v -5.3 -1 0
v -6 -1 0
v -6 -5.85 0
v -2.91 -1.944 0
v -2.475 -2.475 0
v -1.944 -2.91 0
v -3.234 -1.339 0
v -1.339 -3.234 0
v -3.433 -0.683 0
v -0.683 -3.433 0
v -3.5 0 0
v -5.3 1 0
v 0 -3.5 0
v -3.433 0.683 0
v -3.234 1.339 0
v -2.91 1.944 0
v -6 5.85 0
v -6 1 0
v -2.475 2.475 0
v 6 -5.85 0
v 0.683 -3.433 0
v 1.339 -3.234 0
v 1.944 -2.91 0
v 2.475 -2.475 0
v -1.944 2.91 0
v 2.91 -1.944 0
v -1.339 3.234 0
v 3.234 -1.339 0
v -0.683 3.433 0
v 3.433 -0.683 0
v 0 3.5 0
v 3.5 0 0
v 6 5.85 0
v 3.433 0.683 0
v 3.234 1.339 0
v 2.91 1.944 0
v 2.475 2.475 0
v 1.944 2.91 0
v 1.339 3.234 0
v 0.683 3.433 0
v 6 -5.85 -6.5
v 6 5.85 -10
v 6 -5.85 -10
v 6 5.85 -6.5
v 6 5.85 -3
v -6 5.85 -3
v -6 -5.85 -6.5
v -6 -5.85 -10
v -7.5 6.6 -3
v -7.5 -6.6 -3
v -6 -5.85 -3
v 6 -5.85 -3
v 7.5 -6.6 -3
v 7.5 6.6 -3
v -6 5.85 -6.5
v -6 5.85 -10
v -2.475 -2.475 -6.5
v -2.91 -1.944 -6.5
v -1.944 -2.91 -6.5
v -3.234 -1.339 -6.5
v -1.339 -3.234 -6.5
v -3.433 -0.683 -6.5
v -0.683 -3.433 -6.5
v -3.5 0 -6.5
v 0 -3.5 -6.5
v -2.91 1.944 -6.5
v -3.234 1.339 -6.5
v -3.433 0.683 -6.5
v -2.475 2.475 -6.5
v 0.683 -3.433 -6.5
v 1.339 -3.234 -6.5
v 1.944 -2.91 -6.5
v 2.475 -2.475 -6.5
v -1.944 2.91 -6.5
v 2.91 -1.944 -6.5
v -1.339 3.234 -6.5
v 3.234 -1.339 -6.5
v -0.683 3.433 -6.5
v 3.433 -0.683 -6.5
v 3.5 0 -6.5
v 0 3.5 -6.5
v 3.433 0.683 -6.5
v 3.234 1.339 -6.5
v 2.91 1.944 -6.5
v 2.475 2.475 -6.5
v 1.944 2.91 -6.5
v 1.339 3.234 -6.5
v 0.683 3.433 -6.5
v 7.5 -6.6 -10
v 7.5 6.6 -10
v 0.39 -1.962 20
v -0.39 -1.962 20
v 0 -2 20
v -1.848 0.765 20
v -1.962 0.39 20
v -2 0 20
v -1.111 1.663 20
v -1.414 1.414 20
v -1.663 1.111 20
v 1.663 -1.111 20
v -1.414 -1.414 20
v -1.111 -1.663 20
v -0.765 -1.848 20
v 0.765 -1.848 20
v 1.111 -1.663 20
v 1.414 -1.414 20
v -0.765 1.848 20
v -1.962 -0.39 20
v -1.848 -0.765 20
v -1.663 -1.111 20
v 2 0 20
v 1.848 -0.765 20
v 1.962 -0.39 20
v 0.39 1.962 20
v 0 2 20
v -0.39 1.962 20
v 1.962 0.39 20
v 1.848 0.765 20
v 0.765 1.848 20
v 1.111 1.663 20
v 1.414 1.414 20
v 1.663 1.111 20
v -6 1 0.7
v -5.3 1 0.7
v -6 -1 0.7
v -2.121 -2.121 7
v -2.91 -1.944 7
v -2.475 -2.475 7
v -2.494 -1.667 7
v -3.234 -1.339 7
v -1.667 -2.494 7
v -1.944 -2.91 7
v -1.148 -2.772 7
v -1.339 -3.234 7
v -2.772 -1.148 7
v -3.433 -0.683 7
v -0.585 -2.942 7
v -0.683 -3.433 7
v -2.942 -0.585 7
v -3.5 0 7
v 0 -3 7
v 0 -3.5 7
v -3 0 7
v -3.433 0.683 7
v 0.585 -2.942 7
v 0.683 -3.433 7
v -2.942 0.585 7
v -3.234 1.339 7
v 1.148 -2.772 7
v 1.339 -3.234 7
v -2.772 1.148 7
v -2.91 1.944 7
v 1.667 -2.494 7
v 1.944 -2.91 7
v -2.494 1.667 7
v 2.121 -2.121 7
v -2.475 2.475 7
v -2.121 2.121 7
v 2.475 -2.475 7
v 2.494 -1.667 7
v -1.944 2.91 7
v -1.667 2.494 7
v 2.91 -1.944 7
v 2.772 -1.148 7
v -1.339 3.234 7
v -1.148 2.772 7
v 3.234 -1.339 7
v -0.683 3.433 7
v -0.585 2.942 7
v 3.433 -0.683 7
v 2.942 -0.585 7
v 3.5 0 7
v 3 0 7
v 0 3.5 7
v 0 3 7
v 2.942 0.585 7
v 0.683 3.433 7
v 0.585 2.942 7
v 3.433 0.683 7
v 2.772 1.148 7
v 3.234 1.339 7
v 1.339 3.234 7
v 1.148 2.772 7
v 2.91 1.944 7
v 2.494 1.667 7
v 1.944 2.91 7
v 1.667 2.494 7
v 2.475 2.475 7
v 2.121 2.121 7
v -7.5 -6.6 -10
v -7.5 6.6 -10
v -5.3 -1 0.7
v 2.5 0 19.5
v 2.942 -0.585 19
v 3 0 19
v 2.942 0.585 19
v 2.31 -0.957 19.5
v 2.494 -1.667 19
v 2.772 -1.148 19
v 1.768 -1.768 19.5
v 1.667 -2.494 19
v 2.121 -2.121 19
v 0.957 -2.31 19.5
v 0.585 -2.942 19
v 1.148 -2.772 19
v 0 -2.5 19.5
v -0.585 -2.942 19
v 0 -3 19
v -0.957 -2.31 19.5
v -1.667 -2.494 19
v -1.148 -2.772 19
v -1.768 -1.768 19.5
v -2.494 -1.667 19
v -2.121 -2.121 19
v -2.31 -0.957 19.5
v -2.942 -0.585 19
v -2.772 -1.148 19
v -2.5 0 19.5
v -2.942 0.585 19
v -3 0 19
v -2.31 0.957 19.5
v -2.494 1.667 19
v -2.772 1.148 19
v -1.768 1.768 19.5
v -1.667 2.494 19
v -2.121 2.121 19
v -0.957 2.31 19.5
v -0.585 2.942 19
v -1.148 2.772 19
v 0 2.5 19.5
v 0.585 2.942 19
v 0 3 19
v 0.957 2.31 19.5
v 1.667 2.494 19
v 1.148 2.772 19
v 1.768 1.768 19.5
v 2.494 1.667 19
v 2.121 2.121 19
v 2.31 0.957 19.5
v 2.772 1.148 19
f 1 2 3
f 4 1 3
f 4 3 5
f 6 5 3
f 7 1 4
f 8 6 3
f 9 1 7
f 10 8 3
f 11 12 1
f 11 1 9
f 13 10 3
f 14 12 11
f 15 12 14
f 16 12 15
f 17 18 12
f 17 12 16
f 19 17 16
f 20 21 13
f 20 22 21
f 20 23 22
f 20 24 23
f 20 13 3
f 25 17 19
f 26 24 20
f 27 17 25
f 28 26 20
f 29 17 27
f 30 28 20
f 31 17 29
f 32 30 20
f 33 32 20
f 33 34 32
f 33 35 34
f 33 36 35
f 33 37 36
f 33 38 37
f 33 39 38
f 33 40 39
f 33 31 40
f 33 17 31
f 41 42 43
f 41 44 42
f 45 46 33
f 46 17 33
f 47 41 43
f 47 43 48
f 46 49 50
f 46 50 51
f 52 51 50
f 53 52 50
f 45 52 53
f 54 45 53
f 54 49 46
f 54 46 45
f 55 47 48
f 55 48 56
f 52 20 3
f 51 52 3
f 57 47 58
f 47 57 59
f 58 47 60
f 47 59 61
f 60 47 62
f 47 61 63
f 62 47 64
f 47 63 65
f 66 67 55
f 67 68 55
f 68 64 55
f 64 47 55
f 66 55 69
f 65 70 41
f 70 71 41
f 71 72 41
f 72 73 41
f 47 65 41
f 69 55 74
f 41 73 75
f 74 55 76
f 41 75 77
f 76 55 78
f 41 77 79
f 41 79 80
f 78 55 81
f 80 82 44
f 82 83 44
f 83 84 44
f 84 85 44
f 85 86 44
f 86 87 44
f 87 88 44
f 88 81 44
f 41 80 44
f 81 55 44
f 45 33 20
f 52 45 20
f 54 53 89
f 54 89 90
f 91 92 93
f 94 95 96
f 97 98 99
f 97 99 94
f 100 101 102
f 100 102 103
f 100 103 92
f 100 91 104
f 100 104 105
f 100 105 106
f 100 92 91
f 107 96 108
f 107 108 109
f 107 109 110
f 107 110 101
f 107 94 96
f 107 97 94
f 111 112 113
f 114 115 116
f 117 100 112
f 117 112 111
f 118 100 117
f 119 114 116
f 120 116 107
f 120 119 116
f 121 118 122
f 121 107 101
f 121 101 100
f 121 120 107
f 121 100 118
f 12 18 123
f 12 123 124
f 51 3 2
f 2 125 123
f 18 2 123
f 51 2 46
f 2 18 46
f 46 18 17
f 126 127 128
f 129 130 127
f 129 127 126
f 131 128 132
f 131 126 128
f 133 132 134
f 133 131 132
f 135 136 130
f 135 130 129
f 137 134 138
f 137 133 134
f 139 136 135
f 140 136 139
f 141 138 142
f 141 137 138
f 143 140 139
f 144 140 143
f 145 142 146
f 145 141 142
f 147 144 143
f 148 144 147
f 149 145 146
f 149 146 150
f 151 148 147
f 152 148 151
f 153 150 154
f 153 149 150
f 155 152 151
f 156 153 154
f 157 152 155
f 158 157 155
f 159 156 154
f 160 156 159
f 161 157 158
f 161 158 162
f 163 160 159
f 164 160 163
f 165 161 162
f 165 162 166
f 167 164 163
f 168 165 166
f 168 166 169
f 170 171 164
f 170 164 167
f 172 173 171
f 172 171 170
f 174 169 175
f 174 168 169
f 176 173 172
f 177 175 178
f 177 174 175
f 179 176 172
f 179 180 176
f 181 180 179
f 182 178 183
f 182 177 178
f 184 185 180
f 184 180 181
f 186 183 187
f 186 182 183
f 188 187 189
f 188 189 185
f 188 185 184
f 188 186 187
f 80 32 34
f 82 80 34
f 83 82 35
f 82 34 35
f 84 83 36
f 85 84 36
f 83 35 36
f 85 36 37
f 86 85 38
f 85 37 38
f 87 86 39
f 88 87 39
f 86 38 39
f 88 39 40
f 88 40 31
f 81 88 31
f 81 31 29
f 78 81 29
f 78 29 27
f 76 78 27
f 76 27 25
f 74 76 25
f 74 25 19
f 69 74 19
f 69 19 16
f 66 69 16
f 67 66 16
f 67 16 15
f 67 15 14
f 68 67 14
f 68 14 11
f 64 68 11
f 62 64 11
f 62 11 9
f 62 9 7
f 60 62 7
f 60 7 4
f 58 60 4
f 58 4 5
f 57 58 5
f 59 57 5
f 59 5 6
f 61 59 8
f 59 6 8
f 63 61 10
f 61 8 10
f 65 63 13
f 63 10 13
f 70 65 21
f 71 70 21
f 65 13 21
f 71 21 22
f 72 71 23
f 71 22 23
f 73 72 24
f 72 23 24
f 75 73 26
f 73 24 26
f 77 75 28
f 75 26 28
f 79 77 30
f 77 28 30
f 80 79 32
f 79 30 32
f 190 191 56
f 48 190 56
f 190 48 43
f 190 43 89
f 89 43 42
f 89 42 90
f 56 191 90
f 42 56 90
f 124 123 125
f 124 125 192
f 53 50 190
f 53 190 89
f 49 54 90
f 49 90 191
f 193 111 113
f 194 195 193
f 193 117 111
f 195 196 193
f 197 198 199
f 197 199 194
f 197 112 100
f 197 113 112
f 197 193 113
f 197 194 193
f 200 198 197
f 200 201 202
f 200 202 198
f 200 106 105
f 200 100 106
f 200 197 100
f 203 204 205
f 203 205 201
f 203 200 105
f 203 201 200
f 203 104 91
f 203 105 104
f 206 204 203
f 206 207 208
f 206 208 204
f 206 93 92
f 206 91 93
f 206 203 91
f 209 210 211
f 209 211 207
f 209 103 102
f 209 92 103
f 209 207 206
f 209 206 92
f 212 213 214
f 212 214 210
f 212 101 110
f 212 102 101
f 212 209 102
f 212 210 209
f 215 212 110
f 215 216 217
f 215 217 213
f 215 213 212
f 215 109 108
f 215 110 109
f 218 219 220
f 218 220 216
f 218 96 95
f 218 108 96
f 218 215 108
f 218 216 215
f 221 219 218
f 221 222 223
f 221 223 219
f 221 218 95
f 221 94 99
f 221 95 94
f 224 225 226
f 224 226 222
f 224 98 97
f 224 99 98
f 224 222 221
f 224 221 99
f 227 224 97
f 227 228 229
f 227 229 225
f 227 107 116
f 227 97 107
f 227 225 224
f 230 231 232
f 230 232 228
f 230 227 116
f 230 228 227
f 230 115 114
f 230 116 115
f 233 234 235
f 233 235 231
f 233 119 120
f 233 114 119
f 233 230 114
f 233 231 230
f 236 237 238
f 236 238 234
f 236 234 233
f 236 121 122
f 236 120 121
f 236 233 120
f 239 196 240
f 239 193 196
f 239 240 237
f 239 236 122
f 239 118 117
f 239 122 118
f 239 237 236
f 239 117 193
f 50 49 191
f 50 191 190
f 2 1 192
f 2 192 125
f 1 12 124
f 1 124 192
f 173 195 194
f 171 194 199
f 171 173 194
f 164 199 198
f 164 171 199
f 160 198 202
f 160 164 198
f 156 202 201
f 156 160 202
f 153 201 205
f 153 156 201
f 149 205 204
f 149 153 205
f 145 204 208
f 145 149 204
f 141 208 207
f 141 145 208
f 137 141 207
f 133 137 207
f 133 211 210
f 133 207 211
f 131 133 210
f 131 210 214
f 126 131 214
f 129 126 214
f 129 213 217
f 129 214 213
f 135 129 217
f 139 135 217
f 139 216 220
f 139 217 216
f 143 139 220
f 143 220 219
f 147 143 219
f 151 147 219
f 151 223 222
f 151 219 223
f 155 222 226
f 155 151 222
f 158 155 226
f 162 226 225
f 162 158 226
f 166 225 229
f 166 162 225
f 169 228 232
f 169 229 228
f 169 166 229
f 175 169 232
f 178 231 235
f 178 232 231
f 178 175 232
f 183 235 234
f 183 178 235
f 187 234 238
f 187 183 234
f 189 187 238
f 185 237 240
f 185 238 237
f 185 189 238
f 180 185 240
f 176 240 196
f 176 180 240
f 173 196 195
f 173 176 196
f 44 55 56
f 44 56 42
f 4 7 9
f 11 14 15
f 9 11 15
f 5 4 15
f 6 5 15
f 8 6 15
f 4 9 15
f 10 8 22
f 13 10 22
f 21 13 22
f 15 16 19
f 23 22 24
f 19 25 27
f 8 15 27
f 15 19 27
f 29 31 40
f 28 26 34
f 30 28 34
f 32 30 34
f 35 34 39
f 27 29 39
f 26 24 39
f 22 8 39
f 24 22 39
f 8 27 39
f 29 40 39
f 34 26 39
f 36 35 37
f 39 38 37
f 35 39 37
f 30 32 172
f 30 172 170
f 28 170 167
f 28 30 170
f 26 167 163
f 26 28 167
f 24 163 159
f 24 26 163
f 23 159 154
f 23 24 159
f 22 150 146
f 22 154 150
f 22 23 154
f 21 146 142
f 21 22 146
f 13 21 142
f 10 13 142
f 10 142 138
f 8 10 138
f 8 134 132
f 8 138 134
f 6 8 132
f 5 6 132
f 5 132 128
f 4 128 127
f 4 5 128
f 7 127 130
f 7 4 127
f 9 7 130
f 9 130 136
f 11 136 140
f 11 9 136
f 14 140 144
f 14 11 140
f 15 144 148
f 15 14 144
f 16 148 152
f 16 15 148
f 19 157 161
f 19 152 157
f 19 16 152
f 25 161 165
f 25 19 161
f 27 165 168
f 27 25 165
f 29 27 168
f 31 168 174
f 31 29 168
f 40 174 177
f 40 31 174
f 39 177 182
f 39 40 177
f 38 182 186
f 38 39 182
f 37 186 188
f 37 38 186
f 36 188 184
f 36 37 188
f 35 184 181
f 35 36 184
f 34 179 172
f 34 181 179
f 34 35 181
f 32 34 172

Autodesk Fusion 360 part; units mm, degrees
sketch "Sketch1" plane through (0, 0, 0) normal (0, 0, 1) x (1, 0, 0)
  line L0 (6, -5.85) -> (-6, -5.85)
  line L1 (-6, -5.85) -> (-6, 5.85)
  line L2 (-6, 5.85) -> (6, 5.85)
  line L3 (6, 5.85) -> (6, -5.85)
  line L4 (6, -5.85) -> (-6, 5.85) construction
  line L5 (-6, -5.85) -> (6, 5.85) construction
  circle A0 centre (0, 0) radius 3.5
  circle A1 centre (0, 0) radius 3
  line L6 (-6, 1) -> (-5.3, 1)
  line L7 (-5.3, 1) -> (-5.3, -1)
  line L8 (-5.3, -1) -> (-6, -1)
  line L9 (-6, -1) -> (-6, 1)
  line L10 (-7.5, -6.6) -> (7.5, -6.6)
  line L11 (7.5, -6.6) -> (7.5, 6.6)
  line L12 (7.5, 6.6) -> (-7.5, 6.6)
  line L13 (-7.5, 6.6) -> (-7.5, -6.6)
  line L14 (-7.5, -6.6) -> (7.5, 6.6) construction
  line L15 (7.5, -6.6) -> (-7.5, 6.6) construction
  point P0 (-6, 0)
  point P1 (-6, 0)
  dimension "d77" = 12
  dimension "d78" = 11.7
  dimension "d79" = 7
  dimension "d80" = 6
  dimension "d81" = 0.7
  dimension "d82" = 2
  dimension "d83" = 15
  dimension "d84" = 13.2
  dimension "d260" = 0
  dimension "d261" = 0
  dimension "d262" = 0
  dimension "d263" = 0
extrude "Extrude1" add sketch "Sketch1" along normal blind 7 contours A0 | A1 makes body 1
extrude "Extrude2" add sketch "Sketch1" along normal blind 20 contours A1 bodies 1
chamfer "Chamfer1" distance 1 angle 45 1 edges at (-2.797, -1.0848, 20) on bodies 1
extrude "Extrude3" add sketch "Sketch1" against normal blind 6.5 separate body contours L0 L1 L2 L3 L6 L7 L8 | L1 L6 L7 L8 L9 makes body 2
extrude "Extrude4" add sketch "Sketch1" against normal blind 7 from surface at -3 contours L10 L11 L12 L13 bodies 2
extrude "Extrude5" add sketch "Sketch1" along normal blind 0.7 contours L1 L6 L7 L8 L9 bodies 2
combine "Combine1" operation add target body 2 tool bodies 1
